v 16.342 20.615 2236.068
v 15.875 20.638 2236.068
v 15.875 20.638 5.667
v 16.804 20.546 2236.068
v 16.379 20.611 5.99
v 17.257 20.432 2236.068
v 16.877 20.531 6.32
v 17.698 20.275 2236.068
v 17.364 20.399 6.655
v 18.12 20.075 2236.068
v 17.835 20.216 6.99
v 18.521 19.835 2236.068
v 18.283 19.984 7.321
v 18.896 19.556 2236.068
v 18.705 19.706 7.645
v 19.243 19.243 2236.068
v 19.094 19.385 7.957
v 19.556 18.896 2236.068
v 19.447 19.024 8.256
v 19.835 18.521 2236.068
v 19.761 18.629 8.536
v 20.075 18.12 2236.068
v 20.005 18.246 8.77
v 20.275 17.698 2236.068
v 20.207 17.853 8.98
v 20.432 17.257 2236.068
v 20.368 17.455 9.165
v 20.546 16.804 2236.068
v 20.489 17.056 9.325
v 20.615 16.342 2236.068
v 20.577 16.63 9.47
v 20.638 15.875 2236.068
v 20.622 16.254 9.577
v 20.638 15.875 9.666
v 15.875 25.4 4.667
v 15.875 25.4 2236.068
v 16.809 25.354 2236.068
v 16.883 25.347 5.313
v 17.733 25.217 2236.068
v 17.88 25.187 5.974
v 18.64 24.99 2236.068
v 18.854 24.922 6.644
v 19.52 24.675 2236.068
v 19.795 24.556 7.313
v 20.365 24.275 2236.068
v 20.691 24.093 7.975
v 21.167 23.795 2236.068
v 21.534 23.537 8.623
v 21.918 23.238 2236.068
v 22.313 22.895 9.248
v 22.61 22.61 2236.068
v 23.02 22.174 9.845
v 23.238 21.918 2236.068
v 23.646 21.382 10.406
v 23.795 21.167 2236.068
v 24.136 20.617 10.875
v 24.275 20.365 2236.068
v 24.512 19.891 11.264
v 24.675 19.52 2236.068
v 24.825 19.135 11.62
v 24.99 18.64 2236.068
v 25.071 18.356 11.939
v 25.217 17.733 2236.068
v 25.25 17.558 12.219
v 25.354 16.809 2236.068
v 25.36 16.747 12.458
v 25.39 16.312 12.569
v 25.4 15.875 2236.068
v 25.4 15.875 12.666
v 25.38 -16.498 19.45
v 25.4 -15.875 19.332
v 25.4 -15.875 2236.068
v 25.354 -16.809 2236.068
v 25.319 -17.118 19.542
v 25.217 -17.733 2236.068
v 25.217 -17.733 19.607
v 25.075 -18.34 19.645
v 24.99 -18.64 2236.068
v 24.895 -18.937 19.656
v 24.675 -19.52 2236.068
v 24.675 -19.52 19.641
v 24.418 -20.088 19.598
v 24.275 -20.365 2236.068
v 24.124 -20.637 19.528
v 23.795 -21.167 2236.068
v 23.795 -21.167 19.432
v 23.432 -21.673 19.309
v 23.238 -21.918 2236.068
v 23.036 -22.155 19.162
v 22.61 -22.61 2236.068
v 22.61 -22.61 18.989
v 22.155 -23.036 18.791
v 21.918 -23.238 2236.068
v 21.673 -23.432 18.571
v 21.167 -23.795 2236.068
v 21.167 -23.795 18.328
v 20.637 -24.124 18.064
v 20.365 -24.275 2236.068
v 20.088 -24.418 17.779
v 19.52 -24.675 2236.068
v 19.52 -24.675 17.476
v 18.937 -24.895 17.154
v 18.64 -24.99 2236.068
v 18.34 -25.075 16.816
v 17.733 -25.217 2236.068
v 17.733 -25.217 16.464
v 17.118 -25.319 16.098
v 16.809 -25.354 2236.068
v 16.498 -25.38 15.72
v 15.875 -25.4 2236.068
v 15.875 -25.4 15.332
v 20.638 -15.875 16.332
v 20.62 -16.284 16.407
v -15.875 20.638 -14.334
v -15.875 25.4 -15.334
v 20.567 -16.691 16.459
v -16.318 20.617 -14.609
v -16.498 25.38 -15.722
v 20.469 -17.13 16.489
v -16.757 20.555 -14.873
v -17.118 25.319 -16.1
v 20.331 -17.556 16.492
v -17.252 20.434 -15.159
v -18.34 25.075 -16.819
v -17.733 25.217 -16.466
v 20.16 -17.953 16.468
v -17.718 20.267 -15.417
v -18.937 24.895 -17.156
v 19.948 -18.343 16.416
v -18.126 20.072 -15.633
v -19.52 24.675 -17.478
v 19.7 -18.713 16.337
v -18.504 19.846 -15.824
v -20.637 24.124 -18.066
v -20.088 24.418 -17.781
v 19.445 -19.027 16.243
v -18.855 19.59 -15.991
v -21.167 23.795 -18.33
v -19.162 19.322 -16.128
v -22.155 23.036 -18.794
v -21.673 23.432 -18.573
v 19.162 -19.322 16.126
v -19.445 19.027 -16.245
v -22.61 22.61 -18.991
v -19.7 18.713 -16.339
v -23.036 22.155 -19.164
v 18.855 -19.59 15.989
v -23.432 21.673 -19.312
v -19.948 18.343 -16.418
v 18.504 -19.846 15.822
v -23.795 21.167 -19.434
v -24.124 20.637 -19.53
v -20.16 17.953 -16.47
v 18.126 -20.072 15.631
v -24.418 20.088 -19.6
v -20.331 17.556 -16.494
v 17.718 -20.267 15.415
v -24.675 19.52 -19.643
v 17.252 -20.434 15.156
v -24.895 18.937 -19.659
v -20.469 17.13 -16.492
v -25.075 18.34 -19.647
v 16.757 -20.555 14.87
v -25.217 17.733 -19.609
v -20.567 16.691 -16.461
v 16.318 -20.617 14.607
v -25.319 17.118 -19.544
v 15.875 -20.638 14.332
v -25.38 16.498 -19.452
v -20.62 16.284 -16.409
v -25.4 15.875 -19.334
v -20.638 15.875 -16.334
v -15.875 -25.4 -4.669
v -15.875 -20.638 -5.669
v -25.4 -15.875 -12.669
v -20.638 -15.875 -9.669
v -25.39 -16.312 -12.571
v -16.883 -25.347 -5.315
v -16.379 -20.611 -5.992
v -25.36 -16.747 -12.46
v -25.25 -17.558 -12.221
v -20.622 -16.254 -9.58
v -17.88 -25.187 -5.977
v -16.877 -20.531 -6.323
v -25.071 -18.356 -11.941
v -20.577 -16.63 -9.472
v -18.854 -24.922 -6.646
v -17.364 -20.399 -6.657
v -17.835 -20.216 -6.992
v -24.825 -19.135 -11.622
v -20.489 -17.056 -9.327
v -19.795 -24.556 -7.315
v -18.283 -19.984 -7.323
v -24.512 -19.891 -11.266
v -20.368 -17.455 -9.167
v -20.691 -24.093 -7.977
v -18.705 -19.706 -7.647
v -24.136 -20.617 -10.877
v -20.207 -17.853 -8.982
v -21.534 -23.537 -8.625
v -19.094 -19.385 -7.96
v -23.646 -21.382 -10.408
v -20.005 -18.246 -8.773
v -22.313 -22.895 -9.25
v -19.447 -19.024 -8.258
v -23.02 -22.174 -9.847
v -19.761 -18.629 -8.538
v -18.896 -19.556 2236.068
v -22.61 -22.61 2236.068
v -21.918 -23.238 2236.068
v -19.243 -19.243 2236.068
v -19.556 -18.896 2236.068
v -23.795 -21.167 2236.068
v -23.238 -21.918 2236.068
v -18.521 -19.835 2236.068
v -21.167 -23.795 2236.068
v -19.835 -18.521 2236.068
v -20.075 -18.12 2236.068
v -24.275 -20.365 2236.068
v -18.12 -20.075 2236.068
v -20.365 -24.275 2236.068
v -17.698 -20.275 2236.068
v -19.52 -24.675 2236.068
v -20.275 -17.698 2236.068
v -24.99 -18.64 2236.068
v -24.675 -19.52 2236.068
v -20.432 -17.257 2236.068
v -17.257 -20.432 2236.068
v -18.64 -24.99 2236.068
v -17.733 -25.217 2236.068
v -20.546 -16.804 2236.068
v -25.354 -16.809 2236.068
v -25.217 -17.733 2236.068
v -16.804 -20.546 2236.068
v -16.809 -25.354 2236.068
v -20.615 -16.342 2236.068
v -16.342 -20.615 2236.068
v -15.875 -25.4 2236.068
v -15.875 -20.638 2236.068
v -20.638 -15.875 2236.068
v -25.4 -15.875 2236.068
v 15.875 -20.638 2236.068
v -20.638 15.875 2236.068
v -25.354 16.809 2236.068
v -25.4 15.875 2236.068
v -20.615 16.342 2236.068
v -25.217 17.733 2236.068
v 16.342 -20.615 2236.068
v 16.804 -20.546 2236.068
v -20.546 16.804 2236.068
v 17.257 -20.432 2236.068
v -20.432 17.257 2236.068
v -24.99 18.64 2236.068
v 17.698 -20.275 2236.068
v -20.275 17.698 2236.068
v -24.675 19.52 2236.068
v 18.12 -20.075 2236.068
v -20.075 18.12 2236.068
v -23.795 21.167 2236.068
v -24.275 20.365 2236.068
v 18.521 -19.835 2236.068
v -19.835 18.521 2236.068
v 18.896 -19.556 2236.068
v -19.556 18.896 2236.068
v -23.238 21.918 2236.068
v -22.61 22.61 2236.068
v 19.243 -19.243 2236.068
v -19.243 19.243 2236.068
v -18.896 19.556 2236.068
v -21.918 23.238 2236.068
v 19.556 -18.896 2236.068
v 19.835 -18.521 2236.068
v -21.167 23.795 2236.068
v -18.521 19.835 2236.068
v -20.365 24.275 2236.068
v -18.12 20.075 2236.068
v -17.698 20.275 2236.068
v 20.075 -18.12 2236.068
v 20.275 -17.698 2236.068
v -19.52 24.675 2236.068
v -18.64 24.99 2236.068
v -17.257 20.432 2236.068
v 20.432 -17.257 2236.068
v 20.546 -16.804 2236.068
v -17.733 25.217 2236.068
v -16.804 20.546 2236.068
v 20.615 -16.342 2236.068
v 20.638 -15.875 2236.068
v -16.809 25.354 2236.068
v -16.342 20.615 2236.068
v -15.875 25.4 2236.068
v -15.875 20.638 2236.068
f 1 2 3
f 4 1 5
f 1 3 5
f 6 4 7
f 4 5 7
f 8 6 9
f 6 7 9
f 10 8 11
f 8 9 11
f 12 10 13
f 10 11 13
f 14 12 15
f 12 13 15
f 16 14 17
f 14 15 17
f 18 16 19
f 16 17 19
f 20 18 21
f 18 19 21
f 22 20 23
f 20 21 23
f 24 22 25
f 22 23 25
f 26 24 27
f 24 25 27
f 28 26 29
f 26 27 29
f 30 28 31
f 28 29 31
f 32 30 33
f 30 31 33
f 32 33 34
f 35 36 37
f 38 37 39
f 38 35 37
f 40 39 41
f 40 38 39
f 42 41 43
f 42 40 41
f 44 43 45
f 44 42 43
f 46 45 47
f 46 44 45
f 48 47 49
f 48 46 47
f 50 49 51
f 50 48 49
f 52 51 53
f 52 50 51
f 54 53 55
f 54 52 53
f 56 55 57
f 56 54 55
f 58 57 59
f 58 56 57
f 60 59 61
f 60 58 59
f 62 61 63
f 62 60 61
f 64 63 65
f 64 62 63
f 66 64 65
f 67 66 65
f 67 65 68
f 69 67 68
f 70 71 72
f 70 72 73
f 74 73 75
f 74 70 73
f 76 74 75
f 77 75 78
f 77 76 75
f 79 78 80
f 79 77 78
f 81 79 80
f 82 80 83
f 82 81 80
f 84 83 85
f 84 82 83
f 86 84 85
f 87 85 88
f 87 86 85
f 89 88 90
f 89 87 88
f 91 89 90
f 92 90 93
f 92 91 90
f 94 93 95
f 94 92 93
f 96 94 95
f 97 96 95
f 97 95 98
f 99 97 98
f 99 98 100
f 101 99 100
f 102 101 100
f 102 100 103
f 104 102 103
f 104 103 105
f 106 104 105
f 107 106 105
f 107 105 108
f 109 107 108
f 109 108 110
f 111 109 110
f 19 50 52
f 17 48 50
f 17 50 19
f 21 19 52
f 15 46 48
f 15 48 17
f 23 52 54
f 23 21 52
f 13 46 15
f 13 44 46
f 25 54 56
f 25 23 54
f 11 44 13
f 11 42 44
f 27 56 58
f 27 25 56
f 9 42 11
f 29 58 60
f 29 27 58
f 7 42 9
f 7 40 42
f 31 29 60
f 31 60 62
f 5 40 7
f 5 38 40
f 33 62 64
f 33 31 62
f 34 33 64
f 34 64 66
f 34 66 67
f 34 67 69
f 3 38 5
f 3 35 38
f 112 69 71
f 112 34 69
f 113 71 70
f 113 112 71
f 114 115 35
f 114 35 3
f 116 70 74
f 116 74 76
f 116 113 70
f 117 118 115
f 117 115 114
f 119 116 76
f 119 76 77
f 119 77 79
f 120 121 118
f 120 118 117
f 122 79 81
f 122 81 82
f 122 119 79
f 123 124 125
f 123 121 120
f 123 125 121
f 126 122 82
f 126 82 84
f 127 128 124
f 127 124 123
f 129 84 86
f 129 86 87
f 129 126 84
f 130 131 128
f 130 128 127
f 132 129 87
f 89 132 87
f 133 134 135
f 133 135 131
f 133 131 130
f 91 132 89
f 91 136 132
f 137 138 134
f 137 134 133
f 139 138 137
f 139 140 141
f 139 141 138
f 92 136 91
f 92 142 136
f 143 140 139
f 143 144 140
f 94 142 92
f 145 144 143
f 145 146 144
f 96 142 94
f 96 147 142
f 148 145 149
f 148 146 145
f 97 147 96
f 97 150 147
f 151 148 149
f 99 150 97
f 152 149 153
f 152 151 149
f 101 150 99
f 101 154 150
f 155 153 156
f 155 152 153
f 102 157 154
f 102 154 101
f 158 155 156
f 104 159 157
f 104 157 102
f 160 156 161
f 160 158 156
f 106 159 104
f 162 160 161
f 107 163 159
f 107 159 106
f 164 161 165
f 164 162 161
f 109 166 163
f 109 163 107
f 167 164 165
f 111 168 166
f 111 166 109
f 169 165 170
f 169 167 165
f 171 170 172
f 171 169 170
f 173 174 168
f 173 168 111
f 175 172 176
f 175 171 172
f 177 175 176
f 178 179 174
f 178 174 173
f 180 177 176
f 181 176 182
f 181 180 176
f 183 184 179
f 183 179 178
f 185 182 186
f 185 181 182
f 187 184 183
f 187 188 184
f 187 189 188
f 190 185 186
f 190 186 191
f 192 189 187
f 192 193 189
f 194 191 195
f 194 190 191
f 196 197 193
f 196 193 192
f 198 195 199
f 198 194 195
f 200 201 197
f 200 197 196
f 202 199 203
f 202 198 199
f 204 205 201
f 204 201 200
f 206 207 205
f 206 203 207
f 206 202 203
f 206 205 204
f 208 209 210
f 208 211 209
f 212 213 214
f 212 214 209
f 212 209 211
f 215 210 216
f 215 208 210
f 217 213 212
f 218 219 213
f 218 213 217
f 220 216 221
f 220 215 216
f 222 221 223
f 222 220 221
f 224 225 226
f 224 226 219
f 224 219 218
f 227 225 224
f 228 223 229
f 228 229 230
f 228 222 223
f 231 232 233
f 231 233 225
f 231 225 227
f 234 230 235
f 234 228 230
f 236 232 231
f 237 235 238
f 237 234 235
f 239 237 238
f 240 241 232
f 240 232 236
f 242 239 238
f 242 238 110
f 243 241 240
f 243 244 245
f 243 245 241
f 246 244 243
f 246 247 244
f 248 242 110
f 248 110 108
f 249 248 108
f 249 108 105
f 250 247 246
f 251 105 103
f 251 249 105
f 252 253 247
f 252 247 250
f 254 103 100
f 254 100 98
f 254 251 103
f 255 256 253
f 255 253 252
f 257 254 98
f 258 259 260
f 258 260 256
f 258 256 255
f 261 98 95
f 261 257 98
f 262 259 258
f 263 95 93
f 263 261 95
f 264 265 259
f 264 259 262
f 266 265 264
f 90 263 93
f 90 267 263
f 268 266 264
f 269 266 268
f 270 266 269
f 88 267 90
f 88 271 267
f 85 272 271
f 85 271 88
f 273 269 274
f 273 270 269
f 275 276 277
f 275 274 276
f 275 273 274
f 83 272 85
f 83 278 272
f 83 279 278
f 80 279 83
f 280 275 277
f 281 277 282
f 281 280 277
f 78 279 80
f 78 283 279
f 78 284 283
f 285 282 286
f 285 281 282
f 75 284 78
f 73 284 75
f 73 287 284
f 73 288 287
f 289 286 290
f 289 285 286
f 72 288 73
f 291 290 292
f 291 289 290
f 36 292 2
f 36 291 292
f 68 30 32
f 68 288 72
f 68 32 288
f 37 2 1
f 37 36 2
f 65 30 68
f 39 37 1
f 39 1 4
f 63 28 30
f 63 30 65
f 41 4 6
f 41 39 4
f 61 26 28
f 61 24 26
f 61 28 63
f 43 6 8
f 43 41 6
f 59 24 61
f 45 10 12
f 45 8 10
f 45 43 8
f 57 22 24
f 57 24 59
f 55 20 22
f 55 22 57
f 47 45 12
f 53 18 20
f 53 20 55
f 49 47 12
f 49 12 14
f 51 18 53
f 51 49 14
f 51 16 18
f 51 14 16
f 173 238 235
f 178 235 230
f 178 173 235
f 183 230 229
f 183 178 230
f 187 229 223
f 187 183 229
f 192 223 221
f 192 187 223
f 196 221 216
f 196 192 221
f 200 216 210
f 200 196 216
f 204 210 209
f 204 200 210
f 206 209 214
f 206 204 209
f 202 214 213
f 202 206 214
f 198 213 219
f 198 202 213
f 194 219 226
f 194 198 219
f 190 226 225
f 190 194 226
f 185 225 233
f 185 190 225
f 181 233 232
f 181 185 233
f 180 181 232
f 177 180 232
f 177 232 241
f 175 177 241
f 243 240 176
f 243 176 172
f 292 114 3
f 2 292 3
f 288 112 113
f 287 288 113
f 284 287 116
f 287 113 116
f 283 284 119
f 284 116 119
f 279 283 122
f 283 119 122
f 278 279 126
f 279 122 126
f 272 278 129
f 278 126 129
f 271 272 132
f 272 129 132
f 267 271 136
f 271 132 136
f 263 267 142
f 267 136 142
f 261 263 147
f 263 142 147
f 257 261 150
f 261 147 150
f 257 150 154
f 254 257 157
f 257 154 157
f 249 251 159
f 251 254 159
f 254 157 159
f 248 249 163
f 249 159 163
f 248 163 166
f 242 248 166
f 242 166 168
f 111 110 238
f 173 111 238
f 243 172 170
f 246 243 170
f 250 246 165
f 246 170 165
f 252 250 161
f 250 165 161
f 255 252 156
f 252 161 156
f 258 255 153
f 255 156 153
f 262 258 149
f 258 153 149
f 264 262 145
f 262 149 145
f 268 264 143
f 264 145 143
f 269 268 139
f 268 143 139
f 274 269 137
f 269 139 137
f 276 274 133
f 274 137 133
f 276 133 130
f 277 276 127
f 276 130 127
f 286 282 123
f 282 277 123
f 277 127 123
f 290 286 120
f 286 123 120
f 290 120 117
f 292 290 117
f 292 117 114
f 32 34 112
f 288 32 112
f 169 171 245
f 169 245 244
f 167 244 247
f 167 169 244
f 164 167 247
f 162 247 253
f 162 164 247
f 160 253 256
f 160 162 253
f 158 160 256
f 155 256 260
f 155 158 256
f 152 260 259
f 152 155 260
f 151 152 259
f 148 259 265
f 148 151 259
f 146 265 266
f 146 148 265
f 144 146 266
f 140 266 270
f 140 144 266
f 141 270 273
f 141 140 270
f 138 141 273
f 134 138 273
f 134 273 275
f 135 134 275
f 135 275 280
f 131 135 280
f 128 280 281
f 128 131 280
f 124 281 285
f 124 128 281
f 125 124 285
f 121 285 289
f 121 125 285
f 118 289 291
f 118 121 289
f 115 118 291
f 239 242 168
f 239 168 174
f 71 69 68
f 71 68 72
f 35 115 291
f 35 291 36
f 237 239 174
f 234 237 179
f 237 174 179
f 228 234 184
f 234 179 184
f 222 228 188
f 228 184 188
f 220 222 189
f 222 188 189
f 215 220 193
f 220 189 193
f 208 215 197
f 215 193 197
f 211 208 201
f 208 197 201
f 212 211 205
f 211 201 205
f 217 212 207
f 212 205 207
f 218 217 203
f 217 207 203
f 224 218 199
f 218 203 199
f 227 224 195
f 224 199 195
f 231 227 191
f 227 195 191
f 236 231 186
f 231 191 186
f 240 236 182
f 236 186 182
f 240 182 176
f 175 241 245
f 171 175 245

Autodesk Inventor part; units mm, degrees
ref_plane "Plano inicial" through (0, 0, -21.3346) normal (0, 0, 1) x (1, 0, 0)
ref_plane "Plano final" through (0, 0, 2236.068) normal (0, 0, 1) x (1, 0, 0)
sketch "Esboço" plane through (0, 0, 0) normal (0, 0, 1) x (1, 0, 0)
  line L0 (-25.4, -15.875) -> (-25.4, 15.875)
  line L1 (-15.875, 25.4) -> (15.875, 25.4)
  line L2 (25.4, 15.875) -> (25.4, -15.875)
  line L3 (15.875, -25.4) -> (-15.875, -25.4)
  arc A0 (-25.4, -15.875) -> (-15.875, -25.4) centre (-15.875, -15.875) ccw
  arc A1 (-15.875, 25.4) -> (-25.4, 15.875) centre (-15.875, 15.875) ccw
  arc A2 (25.4, 15.875) -> (15.875, 25.4) centre (15.875, 15.875) ccw
  arc A3 (15.875, -25.4) -> (25.4, -15.875) centre (15.875, -15.875) ccw
  arc A4 (-15.875, 20.6375) -> (-20.6375, 15.875) centre (-15.875, 15.875) ccw
  line L4 (-15.875, 20.6375) -> (15.875, 20.6375)
  arc A5 (20.6375, 15.875) -> (15.875, 20.6375) centre (15.875, 15.875) ccw
  line L5 (20.6375, 15.875) -> (20.6375, -15.875)
  arc A6 (15.875, -20.6375) -> (20.6375, -15.875) centre (15.875, -15.875) ccw
  line L6 (15.875, -20.6375) -> (-15.875, -20.6375)
  arc A7 (-20.6375, -15.875) -> (-15.875, -20.6375) centre (-15.875, -15.875) ccw
  line L7 (-20.6375, -15.875) -> (-20.6375, 15.875)
  line L8 (0, 38.3218) -> (0, -38.3218) construction
  line L9 (-38.3218, 0) -> (38.3218, 0) construction
  dimension "d10" = 50.8
  dimension "d11" = 50.8
  dimension "d12" = 4.7625
  dimension "d15" = 25.4
  dimension "d16" = 25.4
  dimension "d17" = 9.525
extrude "Corpo" add sketch "Esboço" along normal up to surface (2257.4026 mm away) from surface at -21.3346
sketch "Sketch3" plane through (0, 0, 0) normal (0, 0, 1) x (1, 0, 0)
  line L0 (0, 0) -> (10, 0)
ref_plane "Work Plane3" through (0, 0, 0) normal (0, -1, 0) x (1, 0, 0)
sketch "Sketch4" plane through (0, 0, 0) normal (0, -1, 0) x (1, 0, 0)
  line L0 (-2, -21.3346) -> (12, -21.3346)
  line L1 (-2, 2236.068) -> (12, 2236.068)
  dimension "d19" = 2257.4026
ref_plane "Plano de trabalho4" through (-28.0859, 9.362, -19.6589) normal (0.5248, -0.1749, -0.8331) x (-0.6498, 0.5499, -0.5248)
split "Dividir1" plane through (-28.0859, 9.362, -19.6589) removes the side toward (0.5248, -0.1749, -0.8331)
equation "\"d10\" = G_H"
equation "\"d11\" = G_W"
equation "\"d12\" = G_T"
equation "\"d15\" = 0.5 * d10"
equation "\"d16\" = 0.5 * d11"
equation "\"d17\" = G_IR"
equation "\"d3\" = G_L"
equation "\"G_W\" = 50.8"
equation "\"G_H\" = 50.8"
equation "\"G_T\" = 4.7625"
equation "\"G_IR\" = 9.525"
equation "\"G_L\" = 2255.40246"
equation "\"G_OFFSET_START\" = 21.3346"
equation "\"G_OFFSET_END\" = 0"
equation "\"d13\" = -G_OFFSET_START"
equation "\"d14\" = G_OFFSET_END + B_L"
equation "\"B_L\" = 2236.06798"
properties part number "AISC - 2 x 2 x 3/16 - 88,795" material "Aço, suave"
